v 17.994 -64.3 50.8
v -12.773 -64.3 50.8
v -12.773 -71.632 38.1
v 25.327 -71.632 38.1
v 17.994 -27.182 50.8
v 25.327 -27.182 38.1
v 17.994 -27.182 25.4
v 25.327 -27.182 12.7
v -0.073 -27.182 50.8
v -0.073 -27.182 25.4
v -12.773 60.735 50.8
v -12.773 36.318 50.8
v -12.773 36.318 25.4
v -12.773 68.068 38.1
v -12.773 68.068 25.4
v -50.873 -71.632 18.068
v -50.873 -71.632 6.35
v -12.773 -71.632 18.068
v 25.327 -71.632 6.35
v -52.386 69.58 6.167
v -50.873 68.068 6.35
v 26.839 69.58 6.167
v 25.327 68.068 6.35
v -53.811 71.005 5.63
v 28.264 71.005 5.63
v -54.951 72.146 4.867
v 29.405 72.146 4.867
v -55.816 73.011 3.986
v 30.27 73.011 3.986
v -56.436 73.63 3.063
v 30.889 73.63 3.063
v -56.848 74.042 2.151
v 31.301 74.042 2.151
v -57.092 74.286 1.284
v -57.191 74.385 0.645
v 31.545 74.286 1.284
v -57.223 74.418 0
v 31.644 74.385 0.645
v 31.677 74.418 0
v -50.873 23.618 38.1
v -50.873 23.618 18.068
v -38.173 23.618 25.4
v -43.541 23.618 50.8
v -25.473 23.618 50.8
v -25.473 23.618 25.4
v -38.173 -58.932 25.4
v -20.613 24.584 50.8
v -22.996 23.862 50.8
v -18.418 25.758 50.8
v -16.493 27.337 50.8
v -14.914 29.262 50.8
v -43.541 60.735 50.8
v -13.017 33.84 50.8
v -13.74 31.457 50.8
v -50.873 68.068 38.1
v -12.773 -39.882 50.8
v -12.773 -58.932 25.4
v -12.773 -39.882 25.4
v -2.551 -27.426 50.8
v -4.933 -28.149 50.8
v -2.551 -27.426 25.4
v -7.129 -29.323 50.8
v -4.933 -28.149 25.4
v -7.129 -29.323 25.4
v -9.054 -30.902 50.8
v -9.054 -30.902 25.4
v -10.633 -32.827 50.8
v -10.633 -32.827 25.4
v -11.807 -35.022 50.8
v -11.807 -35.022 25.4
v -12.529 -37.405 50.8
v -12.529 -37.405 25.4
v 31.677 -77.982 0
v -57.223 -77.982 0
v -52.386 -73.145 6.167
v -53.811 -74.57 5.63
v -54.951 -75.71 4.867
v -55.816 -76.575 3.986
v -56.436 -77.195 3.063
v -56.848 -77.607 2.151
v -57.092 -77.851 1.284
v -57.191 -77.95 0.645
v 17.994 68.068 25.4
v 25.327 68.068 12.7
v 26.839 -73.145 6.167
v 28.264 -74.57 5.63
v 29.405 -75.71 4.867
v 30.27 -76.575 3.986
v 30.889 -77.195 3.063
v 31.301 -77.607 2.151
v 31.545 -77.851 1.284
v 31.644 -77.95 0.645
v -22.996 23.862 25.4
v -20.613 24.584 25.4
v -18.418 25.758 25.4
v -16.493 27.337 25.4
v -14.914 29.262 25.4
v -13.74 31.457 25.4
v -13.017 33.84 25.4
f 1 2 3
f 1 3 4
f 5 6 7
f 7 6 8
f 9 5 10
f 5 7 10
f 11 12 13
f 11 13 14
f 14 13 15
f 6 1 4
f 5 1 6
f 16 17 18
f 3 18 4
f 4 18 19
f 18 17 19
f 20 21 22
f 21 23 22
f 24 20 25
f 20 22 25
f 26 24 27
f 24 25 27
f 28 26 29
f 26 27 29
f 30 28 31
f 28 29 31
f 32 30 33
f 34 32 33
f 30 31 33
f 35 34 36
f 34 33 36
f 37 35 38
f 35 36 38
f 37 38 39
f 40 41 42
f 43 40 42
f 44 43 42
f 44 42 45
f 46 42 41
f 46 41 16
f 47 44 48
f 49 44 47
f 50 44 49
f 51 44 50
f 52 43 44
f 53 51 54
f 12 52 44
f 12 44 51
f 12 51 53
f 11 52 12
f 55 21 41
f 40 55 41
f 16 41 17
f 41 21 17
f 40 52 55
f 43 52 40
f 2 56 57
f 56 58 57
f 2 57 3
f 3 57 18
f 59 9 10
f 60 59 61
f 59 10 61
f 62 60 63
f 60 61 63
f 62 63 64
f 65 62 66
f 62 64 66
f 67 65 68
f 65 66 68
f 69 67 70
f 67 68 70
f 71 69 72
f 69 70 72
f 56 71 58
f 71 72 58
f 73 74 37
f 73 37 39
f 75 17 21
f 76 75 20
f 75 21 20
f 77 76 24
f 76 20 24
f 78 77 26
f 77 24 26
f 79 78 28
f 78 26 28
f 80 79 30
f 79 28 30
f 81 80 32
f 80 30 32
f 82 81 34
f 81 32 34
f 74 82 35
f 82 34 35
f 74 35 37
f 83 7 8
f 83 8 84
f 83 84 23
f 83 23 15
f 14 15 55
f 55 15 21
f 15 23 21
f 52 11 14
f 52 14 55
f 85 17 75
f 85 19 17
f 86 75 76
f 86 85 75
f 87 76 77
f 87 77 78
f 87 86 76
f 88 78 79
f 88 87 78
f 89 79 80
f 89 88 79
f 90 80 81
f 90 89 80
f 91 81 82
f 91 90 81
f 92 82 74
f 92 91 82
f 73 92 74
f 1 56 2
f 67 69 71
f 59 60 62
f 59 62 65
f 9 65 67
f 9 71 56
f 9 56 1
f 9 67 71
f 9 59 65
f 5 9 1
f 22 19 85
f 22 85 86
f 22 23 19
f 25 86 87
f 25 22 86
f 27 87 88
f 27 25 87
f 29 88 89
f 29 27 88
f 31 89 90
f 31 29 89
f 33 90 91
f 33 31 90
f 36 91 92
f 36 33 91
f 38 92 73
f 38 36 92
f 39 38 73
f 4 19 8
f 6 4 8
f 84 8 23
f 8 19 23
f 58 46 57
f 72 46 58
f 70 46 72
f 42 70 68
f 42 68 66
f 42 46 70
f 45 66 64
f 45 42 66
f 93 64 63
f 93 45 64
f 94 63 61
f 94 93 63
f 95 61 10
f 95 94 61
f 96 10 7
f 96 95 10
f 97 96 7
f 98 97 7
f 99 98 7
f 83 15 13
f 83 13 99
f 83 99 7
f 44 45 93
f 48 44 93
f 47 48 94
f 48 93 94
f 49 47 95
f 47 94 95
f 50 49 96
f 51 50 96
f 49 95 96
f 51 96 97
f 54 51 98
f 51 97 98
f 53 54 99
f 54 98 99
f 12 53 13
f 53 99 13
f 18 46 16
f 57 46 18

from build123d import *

# Parameters (mm, degrees)
F0_W        = 88.9000063658
F0_H        = 152.4
F1_DEPTH    = 6.35
F2_DEPTH    = 25.4
F3_DEPTH    = 50.8
F4_R        = 6.34999
F5_C1_SIZE2 = 12.7
F5_C1_SIZE  = 7.3323484187
F5_C2_SIZE2 = 7.3323484187
F5_C2_SIZE  = 12.7
F5_C3_SIZE2 = 7.3323484187
F5_C3_SIZE  = 12.7
F5_C4_SIZE2 = 7.3323484187
F5_C4_SIZE  = 12.7
F5_C5_SIZE2 = 12.7
F5_C5_SIZE  = 7.3323484187
F5_C6_SIZE2 = 7.3323484187
F5_C6_SIZE  = 12.7
F6_SIZE2    = 7.3323484187
F6_SIZE     = 12.7


# Not quite as in the source:
# - a fillet or chamfer is up to 0.001 mm smaller than in the source, because OpenCascade refuses the exact size


with BuildPart() as f1:
    # F0 (on Top) → F1 (new body)
    with BuildSketch(Plane.XY):
        with Locations((-12.7734099567, -1.7824335903)):
            Rectangle(F0_W, F0_H)
        Polygon((-50.8734099567, 23.6175632268), (-50.8734099567, 68.0675632268), (-12.7734099567, 68.0675632268), (25.3265900433, 68.0675632268), (25.3265900433, -27.1824304074), (25.3265900433, -71.6324304074), (-12.7734099567, -71.6324304074), (-50.8734099567, -71.6324304074), align=None, mode=Mode.SUBTRACT)
    extrude(amount=F1_DEPTH)

    # F0 (on Top) → F2 (join)
    with BuildSketch(Plane.XY):
        with BuildLine():
            Line((25.3265900433, 68.0675632268), (-12.7734099567, 68.0675632268))
            Line((-12.7734099567, 68.0675632268), (-12.7734099567, 36.3175632268))
            ThreePointArc((-12.7734099567, 36.3175632268), (-16.4931538356, 27.3373071057), (-25.4734099567, 23.6175632268))
            Line((-25.4734099567, 23.6175632268), (-50.8734099567, 23.6175632268))
            Line((-50.8734099567, 23.6175632268), (-50.8734099567, -71.6324304074))
            Line((-50.8734099567, -71.6324304074), (-12.7734099567, -71.6324304074))
            Line((-12.7734099567, -71.6324304074), (-12.7734099567, -39.8824304074))
            ThreePointArc((-12.7734099567, -39.8824304074), (-9.0536660778, -30.9021742863), (-0.0734099567, -27.1824304074))
            Line((-0.0734099567, -27.1824304074), (25.3265900433, -27.1824304074))
            Line((25.3265900433, -27.1824304074), (25.3265900433, 68.0675632268))
        make_face()
    extrude(amount=F2_DEPTH)

    # F0 (on Top) → F3 (join)
    with BuildSketch(Plane.XY):
        with BuildLine():
            Line((-12.7734099567, 68.0675632268), (-50.8734099567, 68.0675632268))
            Line((-50.8734099567, 68.0675632268), (-50.8734099567, 23.6175632268))
            Line((-50.8734099567, 23.6175632268), (-25.4734099567, 23.6175632268))
            ThreePointArc((-25.4734099567, 23.6175632268), (-16.4931538356, 27.3373071057), (-12.7734099567, 36.3175632268))
            Line((-12.7734099567, 36.3175632268), (-12.7734099567, 68.0675632268))
        make_face()
        with BuildLine():
            Line((25.3265900433, -71.6324304074), (25.3265900433, -27.1824304074))
            Line((25.3265900433, -27.1824304074), (-0.0734099567, -27.1824304074))
            ThreePointArc((-0.0734099567, -27.1824304074), (-9.0536660778, -30.9021742863), (-12.7734099567, -39.8824304074))
            Line((-12.7734099567, -39.8824304074), (-12.7734099567, -71.6324304074))
            Line((-12.7734099567, -71.6324304074), (25.3265900433, -71.6324304074))
        make_face()
    extrude(amount=F3_DEPTH)

    # F4 (radius 6.35 in the source; OpenCascade refuses exactly that, so slightly less here)
    f4_edges = [f1.edges().sort_by_distance(p)[0] for p in [
        (31.676593, -1.782434, 6.35),
        (-12.77341, -77.982434, 6.35),
        (-57.223413, -1.782434, 6.35),
        (-12.77341, 74.417566, 6.35),
    ]]
    fillet(f4_edges, radius=F4_R)

    # F5: chamfer of 12.7 x 7.3323484187 on 6 edges, made by hand

    # F5_c1
    f5_c1_edges = [f1.edges().sort_by_distance(p)[0] for p in [
        (-50.8734099567, -24.0074335903, 25.4),
    ]]
    f5_c1_side = f1.faces().sort_by_distance((-50.8734099567, -24.0074335903, 25.2533530316))[0]
    chamfer(f5_c1_edges, length=F5_C1_SIZE, length2=F5_C1_SIZE2, reference=f5_c1_side)

    # F5_c2
    f5_c2_edges = [f1.edges().sort_by_distance(p)[0] for p in [
        (-31.8234099567, 68.0675632268, 50.8),
    ]]
    f5_c2_side = f1.faces().sort_by_distance((-31.8234099567, 68.0675632268, 50.6533530316))[0]
    chamfer(f5_c2_edges, length=F5_C2_SIZE, length2=F5_C2_SIZE2, reference=f5_c2_side)

    # F5_c3
    f5_c3_edges = [f1.edges().sort_by_distance(p)[0] for p in [
        (25.3265900433, -49.4074304074, 50.8),
    ]]
    f5_c3_side = f1.faces().sort_by_distance((25.3265900433, -49.4074304074, 50.6533530316))[0]
    chamfer(f5_c3_edges, length=F5_C3_SIZE, length2=F5_C3_SIZE2, reference=f5_c3_side)

    # F5_c4
    f5_c4_edges = [f1.edges().sort_by_distance(p)[0] for p in [
        (25.3265900433, 20.4425664097, 25.4),
    ]]
    f5_c4_side = f1.faces().sort_by_distance((25.3265900433, 20.4425664097, 25.2533530316))[0]
    chamfer(f5_c4_edges, length=F5_C4_SIZE, length2=F5_C4_SIZE2, reference=f5_c4_side)

    # F5_c5
    f5_c5_edges = [f1.edges().sort_by_distance(p)[0] for p in [
        (-25.4734099567, -71.6324304074, 25.4),
    ]]
    f5_c5_side = f1.faces().sort_by_distance((-25.4734099567, -71.6324304074, 25.2533530316))[0]
    chamfer(f5_c5_edges, length=F5_C5_SIZE, length2=F5_C5_SIZE2, reference=f5_c5_side)

    # F5_c6
    f5_c6_edges = [f1.edges().sort_by_distance(p)[0] for p in [
        (2.610415834, -71.6324304074, 50.8),
    ]]
    f5_c6_side = f1.faces().sort_by_distance((2.610415834, -71.6324304074, 50.6533530316))[0]
    chamfer(f5_c6_edges, length=F5_C6_SIZE, length2=F5_C6_SIZE2, reference=f5_c6_side)

    # F6
    f6_edges = [f1.edges().sort_by_distance(p)[0] for p in [
        (-50.87341, 42.176389, 50.8),
    ]]
    f6_side = f1.faces().sort_by_distance((-50.87341, 66.601552, 22.225))[0]
    chamfer(f6_edges, length=F6_SIZE, length2=F6_SIZE2, reference=f6_side)


solid = f1.part
